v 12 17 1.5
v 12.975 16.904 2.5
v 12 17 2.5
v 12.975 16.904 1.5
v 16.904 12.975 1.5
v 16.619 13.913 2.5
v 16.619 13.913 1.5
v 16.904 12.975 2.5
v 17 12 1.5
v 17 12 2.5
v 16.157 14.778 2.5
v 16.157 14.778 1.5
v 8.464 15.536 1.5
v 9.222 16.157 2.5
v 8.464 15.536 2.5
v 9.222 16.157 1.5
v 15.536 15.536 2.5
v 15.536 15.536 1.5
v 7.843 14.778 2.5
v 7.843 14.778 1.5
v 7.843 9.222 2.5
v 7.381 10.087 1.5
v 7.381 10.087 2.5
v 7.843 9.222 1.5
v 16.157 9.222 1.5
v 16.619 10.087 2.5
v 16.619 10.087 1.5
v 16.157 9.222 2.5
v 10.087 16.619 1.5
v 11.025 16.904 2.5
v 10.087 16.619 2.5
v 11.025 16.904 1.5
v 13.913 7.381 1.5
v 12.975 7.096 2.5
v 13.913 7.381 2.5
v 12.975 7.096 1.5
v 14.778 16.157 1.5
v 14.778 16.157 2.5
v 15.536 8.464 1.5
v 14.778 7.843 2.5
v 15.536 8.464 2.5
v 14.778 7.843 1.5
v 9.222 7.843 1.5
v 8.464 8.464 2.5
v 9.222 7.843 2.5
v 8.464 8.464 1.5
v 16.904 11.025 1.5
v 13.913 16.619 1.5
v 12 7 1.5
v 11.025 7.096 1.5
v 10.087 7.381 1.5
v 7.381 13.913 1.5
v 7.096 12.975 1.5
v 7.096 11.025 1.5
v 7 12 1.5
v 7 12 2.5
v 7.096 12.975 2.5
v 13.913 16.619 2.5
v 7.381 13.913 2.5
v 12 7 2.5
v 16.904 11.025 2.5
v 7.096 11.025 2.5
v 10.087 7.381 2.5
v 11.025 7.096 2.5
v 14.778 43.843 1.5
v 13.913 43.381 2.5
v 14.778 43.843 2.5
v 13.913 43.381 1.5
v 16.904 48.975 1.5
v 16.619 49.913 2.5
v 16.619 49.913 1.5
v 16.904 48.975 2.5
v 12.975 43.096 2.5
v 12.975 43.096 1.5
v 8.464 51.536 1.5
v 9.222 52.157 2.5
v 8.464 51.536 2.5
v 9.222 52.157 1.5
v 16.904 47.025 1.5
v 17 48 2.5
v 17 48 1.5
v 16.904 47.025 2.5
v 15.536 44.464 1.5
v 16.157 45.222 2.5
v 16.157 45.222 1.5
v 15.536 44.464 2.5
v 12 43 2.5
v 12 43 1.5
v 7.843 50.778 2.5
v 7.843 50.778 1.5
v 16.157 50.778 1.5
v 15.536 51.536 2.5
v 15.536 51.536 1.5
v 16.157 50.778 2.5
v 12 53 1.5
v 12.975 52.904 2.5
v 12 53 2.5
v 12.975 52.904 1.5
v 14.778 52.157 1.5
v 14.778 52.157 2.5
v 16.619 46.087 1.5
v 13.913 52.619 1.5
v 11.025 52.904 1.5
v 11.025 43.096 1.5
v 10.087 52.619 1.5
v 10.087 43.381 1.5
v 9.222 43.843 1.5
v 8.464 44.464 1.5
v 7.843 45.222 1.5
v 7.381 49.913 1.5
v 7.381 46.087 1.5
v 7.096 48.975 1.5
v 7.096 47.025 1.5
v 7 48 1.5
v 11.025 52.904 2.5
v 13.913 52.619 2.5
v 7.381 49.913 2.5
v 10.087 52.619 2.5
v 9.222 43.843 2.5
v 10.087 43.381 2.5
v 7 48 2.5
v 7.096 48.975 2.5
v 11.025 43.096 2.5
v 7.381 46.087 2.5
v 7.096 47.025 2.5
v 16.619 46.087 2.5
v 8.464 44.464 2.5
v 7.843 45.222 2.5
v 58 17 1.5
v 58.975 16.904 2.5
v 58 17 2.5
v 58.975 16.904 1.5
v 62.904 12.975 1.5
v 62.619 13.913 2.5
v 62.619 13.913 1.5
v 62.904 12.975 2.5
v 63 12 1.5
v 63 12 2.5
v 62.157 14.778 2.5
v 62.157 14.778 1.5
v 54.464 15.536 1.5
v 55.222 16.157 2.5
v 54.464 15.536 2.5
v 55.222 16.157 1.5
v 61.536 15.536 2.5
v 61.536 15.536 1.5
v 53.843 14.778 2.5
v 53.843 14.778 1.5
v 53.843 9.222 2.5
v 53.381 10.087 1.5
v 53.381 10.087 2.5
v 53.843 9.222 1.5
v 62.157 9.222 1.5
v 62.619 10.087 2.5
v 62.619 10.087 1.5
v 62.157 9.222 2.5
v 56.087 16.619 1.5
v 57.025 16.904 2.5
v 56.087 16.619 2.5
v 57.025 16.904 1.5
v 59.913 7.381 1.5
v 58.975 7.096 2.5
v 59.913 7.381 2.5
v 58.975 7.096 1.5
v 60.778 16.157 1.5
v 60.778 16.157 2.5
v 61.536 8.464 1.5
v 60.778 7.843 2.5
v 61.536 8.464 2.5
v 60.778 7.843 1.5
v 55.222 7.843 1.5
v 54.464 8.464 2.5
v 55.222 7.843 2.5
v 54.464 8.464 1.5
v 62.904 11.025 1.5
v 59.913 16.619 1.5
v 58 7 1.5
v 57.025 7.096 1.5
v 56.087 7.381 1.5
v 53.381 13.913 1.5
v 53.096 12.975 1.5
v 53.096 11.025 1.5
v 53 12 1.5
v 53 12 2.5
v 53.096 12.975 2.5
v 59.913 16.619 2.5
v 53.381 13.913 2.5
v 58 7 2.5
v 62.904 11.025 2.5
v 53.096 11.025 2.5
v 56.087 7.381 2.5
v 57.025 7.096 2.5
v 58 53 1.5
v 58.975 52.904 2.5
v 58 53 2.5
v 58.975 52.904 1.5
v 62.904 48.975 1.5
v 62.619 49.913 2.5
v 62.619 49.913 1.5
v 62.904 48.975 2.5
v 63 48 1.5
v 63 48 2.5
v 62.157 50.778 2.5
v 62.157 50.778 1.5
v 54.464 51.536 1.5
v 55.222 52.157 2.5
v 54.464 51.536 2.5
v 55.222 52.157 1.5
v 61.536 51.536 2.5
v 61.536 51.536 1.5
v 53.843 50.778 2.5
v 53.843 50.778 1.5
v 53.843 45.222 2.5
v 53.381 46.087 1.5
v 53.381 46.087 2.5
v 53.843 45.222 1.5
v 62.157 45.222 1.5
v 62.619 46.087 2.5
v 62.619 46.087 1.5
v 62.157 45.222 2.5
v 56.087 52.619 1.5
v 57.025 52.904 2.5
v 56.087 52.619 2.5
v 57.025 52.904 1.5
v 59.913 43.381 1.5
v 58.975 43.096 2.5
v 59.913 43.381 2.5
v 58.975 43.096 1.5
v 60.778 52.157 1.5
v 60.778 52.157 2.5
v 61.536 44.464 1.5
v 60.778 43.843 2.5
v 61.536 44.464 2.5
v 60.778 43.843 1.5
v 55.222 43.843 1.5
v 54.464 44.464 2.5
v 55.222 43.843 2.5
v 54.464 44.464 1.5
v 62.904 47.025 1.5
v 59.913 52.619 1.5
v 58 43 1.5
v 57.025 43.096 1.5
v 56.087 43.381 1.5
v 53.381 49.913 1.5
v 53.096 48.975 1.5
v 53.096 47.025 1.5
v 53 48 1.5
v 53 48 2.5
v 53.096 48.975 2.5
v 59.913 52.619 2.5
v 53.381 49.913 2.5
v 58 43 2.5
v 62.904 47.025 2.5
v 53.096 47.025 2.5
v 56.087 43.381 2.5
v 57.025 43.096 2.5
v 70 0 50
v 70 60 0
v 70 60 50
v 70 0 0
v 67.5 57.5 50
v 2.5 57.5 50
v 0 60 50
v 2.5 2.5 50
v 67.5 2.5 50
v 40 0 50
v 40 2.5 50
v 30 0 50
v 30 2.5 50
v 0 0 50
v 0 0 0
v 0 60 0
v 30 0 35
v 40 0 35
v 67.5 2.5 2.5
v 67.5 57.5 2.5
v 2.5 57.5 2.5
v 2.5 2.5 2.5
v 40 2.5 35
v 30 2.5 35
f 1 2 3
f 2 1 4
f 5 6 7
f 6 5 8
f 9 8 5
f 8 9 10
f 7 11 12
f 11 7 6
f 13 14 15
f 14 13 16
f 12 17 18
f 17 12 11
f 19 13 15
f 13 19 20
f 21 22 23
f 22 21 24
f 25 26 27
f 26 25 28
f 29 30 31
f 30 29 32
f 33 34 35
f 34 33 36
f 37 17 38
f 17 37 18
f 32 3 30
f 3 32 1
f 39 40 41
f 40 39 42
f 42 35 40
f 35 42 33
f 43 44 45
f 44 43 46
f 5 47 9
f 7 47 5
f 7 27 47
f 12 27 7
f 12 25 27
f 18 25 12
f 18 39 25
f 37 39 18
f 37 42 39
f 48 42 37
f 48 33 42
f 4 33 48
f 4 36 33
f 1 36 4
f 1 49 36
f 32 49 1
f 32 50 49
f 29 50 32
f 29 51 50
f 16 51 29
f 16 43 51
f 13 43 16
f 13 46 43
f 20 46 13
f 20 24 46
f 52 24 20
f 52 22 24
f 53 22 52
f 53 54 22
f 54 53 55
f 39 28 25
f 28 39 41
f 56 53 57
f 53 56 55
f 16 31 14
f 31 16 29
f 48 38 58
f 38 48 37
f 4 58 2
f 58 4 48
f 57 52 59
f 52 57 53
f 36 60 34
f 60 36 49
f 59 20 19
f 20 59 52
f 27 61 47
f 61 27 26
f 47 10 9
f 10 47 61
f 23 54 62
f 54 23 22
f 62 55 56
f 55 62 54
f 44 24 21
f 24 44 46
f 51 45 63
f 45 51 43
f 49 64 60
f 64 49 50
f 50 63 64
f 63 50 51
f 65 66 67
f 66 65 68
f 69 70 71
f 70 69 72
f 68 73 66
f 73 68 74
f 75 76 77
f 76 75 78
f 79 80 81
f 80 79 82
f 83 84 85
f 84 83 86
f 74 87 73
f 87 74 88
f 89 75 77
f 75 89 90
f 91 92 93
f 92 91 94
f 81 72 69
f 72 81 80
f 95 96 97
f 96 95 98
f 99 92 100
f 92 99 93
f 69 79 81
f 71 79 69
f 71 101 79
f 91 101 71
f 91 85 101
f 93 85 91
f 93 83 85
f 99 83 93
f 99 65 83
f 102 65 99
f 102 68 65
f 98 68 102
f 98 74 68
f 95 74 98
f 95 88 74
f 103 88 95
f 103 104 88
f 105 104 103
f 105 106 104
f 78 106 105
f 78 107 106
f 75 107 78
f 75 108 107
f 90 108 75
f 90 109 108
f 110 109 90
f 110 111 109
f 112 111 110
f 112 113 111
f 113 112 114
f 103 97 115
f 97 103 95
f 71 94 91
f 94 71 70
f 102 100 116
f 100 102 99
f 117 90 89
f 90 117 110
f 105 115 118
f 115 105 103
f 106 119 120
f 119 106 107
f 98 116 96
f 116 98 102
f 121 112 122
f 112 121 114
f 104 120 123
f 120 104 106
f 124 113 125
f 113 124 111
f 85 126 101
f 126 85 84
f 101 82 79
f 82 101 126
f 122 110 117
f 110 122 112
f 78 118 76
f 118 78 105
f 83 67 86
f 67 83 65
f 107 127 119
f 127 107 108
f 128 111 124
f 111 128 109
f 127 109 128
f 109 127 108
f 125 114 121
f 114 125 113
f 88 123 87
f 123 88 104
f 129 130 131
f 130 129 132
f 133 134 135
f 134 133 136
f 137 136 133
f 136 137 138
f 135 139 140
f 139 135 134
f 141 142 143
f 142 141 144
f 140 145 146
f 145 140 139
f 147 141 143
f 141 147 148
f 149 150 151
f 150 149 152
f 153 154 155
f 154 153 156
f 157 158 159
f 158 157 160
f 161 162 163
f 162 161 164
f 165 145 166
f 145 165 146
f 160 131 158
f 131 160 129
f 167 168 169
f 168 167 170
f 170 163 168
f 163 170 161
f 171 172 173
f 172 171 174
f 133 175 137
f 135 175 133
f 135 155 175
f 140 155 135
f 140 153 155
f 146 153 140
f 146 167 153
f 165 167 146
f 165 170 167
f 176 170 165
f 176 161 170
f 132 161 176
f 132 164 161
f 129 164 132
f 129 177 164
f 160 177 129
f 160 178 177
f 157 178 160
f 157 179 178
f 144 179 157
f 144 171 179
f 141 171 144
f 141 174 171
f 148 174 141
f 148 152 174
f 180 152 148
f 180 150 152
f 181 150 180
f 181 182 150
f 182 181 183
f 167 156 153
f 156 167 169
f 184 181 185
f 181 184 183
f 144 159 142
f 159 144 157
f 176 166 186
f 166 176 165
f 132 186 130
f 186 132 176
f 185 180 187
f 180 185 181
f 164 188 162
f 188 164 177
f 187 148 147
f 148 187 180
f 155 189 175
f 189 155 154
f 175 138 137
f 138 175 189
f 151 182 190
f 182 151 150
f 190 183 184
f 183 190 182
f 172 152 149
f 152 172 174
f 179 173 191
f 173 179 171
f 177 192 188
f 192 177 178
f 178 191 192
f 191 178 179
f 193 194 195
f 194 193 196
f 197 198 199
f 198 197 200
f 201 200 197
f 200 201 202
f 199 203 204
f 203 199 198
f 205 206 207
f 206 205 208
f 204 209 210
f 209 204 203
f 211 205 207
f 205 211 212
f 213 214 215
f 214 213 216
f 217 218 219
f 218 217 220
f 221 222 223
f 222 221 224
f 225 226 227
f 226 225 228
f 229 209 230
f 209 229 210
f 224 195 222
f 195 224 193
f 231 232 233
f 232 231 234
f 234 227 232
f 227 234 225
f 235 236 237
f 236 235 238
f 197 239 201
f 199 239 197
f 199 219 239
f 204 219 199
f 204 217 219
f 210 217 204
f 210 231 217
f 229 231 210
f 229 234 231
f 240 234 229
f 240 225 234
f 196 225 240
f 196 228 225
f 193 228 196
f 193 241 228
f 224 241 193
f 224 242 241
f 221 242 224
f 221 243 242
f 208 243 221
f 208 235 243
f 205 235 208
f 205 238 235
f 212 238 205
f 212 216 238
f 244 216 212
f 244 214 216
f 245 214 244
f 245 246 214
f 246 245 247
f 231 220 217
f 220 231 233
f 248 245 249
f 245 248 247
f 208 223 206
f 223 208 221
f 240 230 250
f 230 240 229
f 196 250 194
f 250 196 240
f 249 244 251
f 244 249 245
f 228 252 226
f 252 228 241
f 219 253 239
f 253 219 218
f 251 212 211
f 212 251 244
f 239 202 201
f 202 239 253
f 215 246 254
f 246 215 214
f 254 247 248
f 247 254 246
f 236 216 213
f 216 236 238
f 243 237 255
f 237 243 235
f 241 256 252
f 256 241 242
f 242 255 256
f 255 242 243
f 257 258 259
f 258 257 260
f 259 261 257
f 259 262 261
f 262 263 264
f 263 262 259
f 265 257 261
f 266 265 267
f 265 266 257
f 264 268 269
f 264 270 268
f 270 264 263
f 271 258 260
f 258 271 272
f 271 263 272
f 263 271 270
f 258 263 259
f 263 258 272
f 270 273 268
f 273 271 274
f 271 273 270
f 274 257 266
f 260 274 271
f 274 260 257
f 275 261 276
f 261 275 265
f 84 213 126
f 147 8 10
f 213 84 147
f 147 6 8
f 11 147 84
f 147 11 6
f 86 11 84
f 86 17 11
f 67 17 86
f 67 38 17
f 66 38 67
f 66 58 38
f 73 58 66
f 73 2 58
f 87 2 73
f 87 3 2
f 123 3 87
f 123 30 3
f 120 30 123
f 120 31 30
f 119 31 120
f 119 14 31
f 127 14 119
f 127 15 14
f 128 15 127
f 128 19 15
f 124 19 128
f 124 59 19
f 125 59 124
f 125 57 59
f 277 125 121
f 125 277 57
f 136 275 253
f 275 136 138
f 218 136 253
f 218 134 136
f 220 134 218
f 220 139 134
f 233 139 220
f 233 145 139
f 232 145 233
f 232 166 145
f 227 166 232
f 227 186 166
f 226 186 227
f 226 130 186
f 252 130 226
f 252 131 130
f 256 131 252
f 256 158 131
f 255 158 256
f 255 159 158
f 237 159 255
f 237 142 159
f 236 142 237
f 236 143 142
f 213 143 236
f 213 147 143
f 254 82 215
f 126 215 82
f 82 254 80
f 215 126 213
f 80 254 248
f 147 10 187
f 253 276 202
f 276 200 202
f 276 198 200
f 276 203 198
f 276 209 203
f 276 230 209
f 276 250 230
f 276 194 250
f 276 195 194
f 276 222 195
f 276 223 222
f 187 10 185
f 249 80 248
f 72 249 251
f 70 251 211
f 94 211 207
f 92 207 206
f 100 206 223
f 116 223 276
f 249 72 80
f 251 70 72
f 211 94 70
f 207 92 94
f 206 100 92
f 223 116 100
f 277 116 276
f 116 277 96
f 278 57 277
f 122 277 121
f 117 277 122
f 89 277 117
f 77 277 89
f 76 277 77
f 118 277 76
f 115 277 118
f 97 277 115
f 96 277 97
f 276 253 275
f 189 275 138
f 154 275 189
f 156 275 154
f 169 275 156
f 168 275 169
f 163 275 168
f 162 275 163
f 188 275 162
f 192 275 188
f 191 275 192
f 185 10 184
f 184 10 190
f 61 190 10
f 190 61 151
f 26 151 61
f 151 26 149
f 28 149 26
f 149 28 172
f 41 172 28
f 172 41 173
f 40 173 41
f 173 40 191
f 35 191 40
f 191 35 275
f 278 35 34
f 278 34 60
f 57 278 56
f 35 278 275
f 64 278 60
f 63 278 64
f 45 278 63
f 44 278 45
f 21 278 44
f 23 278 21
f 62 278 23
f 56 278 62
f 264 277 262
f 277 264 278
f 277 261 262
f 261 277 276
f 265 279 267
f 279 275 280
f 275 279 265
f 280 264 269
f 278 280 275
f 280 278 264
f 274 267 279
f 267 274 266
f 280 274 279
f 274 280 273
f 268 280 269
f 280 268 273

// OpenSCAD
$fn = 32;

// ----------------------------------------------------------------------
// Enclosure box: both enclosure
// ----------------------------------------------------------------------

// --- parameters (mm) ---
box_l = 70;               // outer length, X
box_w = 60;               // outer width, Y
box_h = 50;               // outer height
wall_t = 2.5;             // wall thickness
boss_r = 5;               // corner boss radius
hole_r = 1.5;             // boss screw hole radius
boss_in = 12;             // boss inset from the corners
notch_w = 10;             // cable notch width
notch_h = 15;             // cable notch height
fit_tol = 0.02;           // tolerance for press fits, mm
free_tol = 0.2;           // tolerance for clearance fits, mm

inner_h = box_h - wall_t;  // cavity depth
boss_h = inner_h - 2;  // corner boss height

difference() {
  cube([box_l, box_w, box_h]);
  translate([wall_t, wall_t, wall_t])
    cube([box_l - 2 * wall_t, box_w - 2 * wall_t, box_h]);
  for (sx = [0, 1], sy = [0, 1])
    translate([sx ? box_l - boss_in : boss_in,
               sy ? box_w - boss_in : boss_in, wall_t - 1]) {
      cylinder(r = boss_r, h = boss_h);
      translate([0, 0, boss_h - 4])
        cylinder(r = hole_r, h = 5);
    }
  translate([box_l / 2 - notch_w / 2, -1, box_h - notch_h])
    cube([notch_w, wall_t + 2, notch_h + 1]);
}
